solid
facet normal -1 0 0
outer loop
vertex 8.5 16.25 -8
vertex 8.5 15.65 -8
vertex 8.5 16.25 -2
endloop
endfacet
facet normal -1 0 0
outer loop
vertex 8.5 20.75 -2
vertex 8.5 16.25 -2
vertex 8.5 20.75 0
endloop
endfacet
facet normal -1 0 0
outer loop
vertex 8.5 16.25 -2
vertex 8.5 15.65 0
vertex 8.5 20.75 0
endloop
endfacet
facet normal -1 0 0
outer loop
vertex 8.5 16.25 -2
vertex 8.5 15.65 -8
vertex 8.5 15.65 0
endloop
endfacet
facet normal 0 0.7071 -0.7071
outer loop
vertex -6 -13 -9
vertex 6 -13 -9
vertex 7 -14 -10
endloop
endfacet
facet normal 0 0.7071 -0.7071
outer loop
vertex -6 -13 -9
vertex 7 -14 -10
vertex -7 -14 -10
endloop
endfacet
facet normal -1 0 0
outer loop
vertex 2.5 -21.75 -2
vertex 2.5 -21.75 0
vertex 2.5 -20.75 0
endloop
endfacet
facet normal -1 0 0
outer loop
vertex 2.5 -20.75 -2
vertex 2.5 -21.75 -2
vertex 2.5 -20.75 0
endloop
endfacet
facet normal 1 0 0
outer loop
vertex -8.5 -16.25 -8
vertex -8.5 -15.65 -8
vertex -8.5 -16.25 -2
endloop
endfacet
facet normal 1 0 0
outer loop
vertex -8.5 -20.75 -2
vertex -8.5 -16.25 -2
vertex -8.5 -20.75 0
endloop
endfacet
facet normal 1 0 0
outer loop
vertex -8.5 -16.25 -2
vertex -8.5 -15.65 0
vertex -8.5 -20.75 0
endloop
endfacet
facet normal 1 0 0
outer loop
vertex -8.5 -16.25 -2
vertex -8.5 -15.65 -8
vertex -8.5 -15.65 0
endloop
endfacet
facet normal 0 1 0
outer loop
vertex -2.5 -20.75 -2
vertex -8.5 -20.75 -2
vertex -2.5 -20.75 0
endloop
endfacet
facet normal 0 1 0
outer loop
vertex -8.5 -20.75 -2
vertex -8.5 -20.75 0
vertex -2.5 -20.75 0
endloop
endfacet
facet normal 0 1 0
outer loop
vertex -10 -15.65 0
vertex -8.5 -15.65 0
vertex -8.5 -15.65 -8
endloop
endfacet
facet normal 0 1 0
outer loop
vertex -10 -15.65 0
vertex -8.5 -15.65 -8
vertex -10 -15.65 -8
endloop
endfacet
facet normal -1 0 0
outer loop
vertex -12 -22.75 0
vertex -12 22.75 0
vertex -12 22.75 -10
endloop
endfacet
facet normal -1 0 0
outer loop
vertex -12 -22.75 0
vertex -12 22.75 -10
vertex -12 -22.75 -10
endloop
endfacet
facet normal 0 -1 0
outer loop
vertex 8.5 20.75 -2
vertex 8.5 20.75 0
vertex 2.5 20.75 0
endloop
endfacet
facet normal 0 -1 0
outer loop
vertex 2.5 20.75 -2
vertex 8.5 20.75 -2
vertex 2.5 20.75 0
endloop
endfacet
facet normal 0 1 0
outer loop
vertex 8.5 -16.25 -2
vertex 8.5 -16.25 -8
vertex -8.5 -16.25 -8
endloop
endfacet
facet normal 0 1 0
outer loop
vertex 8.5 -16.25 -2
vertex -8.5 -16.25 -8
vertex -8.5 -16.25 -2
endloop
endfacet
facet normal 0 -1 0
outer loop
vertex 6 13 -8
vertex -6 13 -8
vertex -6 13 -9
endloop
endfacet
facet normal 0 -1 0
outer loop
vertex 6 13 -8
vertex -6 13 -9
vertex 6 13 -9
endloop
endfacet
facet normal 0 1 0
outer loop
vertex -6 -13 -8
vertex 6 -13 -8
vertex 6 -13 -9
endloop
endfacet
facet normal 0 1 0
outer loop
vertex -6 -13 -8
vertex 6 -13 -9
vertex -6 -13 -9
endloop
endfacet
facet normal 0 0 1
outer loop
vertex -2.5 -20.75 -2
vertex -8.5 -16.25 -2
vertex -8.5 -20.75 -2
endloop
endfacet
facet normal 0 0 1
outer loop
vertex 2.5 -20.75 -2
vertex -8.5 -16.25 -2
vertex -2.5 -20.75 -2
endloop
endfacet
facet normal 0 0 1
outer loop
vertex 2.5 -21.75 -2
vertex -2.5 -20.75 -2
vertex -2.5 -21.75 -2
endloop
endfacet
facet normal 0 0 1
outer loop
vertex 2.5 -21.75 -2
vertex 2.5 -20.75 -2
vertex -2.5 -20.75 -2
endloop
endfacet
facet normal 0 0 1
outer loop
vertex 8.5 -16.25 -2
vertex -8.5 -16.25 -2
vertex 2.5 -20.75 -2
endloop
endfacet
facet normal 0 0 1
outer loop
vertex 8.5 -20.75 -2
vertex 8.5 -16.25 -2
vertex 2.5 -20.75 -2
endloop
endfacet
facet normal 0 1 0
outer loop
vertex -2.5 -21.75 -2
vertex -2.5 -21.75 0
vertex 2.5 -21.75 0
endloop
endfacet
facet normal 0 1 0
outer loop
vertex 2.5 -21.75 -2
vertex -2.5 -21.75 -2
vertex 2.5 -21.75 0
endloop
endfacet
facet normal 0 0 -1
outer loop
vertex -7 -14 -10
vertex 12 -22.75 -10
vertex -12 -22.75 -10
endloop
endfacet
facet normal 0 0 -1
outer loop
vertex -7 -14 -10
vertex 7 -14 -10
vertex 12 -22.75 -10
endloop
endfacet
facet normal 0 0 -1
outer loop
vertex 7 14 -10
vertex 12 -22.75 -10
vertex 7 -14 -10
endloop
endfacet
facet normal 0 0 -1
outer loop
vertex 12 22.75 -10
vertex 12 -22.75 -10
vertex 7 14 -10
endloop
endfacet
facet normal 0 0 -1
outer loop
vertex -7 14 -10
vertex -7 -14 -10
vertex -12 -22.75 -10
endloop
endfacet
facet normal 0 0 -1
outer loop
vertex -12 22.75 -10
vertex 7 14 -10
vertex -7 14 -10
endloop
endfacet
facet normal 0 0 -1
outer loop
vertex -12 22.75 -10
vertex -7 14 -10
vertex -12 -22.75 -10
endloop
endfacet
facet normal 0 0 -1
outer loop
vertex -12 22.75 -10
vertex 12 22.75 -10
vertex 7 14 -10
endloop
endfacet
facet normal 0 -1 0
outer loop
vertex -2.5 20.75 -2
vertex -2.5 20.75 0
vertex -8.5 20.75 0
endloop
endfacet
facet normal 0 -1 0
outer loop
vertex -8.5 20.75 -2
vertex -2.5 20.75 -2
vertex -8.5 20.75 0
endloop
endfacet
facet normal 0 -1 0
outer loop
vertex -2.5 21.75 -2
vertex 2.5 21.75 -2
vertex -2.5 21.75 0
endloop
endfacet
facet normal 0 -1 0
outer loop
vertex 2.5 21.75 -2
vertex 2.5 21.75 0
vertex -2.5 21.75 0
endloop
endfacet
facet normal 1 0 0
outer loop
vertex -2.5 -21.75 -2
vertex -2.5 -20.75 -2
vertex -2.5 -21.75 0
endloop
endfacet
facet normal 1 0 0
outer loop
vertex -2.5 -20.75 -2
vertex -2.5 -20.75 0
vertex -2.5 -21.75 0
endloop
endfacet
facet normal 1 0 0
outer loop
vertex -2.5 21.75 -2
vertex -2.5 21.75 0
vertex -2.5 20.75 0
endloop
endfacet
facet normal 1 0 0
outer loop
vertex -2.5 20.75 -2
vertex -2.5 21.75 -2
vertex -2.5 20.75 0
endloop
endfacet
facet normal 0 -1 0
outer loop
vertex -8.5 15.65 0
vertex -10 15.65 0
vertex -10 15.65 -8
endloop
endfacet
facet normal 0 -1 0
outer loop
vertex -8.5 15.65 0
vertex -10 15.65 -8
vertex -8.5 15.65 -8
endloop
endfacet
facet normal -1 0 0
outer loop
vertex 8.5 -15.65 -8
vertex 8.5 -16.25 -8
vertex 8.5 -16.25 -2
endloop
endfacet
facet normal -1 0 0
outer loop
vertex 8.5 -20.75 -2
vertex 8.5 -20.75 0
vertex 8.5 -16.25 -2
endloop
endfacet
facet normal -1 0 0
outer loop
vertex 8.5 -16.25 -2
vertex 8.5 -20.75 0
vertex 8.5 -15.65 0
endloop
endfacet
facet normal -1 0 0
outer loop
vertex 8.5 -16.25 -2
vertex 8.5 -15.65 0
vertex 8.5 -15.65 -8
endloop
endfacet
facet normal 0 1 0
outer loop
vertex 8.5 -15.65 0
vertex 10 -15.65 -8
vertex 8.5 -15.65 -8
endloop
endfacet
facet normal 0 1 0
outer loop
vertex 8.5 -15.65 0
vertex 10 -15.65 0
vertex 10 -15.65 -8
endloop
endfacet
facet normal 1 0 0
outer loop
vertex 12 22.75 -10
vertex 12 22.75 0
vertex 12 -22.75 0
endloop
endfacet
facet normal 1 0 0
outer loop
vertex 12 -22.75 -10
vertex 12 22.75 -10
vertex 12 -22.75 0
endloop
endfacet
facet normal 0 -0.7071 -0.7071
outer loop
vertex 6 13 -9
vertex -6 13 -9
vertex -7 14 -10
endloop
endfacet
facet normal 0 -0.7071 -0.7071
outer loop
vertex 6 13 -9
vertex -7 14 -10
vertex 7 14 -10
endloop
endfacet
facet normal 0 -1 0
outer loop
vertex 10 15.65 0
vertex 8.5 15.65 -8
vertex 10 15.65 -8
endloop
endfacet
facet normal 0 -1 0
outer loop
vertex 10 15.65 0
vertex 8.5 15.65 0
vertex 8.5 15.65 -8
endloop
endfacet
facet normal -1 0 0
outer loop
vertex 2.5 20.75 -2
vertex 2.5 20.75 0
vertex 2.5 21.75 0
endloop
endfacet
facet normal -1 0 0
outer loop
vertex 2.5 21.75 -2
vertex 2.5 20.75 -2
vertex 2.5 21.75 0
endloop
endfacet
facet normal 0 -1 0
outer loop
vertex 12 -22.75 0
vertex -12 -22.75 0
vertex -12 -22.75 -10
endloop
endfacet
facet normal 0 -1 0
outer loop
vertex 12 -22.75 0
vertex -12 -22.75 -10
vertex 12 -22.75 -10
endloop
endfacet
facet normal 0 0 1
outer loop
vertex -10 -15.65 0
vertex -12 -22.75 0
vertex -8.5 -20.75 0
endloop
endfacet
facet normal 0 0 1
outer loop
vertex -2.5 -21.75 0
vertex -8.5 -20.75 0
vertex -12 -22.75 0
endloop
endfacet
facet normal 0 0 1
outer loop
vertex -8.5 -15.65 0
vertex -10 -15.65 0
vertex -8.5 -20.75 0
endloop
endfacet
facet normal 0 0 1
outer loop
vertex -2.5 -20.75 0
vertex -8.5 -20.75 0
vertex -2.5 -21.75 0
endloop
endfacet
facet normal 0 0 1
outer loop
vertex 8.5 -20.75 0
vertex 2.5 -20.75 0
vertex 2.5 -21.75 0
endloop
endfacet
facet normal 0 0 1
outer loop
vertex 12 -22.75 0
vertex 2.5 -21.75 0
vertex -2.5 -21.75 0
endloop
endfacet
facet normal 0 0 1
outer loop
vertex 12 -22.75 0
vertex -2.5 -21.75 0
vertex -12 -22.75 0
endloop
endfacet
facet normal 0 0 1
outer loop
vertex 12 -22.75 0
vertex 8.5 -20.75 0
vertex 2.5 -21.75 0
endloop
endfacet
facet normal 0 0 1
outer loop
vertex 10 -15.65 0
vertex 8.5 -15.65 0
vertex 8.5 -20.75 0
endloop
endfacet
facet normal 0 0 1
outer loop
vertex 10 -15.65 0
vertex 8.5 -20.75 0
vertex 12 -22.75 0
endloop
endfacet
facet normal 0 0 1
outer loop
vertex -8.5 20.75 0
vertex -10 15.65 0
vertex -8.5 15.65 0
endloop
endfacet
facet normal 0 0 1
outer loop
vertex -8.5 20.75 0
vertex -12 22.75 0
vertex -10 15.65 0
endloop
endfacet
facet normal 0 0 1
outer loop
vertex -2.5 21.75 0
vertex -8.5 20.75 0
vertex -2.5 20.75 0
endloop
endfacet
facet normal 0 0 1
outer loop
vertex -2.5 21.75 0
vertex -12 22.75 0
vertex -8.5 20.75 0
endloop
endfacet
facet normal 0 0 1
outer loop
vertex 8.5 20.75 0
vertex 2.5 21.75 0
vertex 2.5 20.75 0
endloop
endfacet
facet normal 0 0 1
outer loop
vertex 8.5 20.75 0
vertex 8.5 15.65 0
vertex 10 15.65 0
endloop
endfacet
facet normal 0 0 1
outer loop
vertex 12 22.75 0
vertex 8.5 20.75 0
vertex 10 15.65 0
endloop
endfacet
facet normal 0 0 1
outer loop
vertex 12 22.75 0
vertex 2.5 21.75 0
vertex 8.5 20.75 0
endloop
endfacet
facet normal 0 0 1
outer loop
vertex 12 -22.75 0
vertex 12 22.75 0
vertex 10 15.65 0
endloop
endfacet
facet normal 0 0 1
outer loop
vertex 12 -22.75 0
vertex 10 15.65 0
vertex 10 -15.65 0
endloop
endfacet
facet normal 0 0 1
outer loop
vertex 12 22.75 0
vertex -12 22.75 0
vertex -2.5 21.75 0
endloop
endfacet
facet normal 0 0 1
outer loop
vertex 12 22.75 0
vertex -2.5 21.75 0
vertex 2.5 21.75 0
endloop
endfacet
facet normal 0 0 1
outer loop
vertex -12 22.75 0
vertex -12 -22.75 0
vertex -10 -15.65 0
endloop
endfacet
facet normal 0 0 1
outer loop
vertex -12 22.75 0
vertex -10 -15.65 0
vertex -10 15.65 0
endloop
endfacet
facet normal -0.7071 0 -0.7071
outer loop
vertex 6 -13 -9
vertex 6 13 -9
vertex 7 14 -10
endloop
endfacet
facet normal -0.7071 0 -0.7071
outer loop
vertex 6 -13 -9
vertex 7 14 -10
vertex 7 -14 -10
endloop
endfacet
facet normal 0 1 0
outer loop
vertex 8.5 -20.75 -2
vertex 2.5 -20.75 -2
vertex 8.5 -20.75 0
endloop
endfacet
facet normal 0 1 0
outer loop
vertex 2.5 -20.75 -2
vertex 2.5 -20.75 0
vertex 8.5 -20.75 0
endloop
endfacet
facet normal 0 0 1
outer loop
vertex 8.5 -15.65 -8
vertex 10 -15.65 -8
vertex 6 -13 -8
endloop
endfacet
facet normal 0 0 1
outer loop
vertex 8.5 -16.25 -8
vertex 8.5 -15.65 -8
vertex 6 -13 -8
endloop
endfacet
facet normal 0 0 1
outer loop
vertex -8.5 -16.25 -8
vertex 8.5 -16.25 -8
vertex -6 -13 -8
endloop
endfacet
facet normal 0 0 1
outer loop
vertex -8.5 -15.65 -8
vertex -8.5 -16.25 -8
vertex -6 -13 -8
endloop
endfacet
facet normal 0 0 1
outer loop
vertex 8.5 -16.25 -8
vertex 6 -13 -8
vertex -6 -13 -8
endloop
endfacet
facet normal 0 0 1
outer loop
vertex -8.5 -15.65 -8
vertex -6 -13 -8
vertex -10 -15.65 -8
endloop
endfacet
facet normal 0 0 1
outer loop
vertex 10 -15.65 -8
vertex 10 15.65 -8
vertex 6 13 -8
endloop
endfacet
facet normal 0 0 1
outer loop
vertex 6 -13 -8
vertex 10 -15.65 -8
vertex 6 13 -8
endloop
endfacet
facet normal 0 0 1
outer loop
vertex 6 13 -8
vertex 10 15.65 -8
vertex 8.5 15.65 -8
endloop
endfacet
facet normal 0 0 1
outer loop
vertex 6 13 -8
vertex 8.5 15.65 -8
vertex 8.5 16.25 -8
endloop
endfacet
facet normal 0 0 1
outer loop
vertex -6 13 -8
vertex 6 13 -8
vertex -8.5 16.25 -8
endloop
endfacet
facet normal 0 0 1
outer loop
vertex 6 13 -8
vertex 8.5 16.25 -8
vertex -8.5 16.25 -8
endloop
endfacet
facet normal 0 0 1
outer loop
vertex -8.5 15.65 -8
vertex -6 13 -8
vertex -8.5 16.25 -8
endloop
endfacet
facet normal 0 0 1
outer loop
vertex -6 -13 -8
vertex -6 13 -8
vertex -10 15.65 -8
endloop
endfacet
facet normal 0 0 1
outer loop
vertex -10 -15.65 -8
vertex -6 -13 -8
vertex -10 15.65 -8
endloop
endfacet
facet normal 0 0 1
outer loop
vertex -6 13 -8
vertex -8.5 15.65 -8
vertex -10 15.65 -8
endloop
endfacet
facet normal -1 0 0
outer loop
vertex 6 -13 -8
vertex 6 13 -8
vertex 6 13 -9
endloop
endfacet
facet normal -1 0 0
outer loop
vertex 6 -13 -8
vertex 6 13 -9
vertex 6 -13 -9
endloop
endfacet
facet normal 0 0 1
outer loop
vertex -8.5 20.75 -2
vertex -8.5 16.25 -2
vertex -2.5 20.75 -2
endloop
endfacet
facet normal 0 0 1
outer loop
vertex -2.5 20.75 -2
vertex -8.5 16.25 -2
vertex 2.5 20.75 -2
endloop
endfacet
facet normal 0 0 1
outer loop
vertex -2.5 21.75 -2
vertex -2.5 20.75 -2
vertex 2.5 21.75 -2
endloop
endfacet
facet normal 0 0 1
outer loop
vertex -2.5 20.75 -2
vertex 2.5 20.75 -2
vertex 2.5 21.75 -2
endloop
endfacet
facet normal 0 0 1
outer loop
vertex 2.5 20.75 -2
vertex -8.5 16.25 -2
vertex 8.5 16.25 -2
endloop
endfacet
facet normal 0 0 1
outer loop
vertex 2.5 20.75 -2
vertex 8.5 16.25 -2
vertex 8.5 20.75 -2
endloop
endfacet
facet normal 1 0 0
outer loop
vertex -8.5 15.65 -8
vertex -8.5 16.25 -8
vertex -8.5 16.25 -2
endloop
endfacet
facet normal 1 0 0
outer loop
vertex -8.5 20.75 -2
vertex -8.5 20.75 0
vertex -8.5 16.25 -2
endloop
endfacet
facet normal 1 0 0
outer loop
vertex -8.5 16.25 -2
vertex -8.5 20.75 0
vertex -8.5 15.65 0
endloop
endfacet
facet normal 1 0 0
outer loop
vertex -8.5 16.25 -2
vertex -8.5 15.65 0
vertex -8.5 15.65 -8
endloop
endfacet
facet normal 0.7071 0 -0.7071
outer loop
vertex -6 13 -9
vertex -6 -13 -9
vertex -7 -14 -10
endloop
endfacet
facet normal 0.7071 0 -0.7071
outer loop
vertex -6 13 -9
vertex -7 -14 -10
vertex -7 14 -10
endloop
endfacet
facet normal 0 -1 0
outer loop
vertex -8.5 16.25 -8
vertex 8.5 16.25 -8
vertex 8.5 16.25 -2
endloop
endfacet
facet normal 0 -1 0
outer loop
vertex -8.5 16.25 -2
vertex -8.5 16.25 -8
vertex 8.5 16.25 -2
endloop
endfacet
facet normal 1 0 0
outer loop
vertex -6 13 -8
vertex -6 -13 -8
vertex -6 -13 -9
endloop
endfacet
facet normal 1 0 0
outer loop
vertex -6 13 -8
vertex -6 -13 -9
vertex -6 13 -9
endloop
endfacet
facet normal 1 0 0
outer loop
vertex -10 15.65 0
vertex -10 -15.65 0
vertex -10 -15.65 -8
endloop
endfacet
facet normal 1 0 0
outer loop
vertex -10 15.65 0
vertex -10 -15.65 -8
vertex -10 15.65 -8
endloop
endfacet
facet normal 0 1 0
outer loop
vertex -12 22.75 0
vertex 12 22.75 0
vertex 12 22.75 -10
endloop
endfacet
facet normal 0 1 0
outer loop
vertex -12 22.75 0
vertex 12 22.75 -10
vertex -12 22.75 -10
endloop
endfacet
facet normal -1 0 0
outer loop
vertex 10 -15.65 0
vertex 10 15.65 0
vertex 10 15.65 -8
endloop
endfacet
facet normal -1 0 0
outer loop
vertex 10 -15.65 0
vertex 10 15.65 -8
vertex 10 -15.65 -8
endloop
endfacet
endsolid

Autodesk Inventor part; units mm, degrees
ref_plane "YZ Plane" through (0, 0, 0) normal (1, 0, 0) x (0, 1, 0)
ref_plane "XZ Plane" through (0, 0, 0) normal (0, 1, 0) x (-1, 0, 0)
ref_plane "XY Plane" through (0, 0, 0) normal (0, 0, 1) x (1, 0, 0)
sketch "Sketch1" plane through (0, 0, 0) normal (0, 0, 1) x (1, 0, 0)
  line L0 (-10, -15.65) -> (-10, 15.65) projected
  line L1 (-10, 15.65) -> (10, 15.65) projected
  line L2 (10, 15.65) -> (10, -15.65) projected
  line L3 (10, -15.65) -> (-10, -15.65) projected
  line L4 (1.5877, -12.1184) -> (1.5877, -10.9726) projected
  line L5 (5.119, -12.1184) -> (1.5877, -12.1184) projected
  line L6 (5.119, 11.1491) -> (5.119, -12.1184) projected
  line L7 (2.2936, 11.1491) -> (5.119, 11.1491) projected
  line L8 (2.2936, 12.739) -> (2.2936, 11.1491) projected
  line L9 (-2.2936, 12.739) -> (2.2936, 12.739) projected
  line L10 (-2.2936, 11.1491) -> (-2.2936, 12.739) projected
  line L11 (-5.119, 11.1491) -> (-2.2936, 11.1491) projected
  line L12 (-5.119, -12.1184) -> (-5.119, 11.1491) projected
  line L13 (-1.5877, -12.1184) -> (-5.119, -12.1184) projected
  line L14 (-1.5877, -10.9726) -> (-1.5877, -12.1184) projected
  line L15 (-4.1285, -10.9726) -> (-1.5877, -10.9726) projected
  line L16 (-4.1285, 10.0169) -> (-4.1285, -10.9726) projected
  line L17 (4.1285, 10.0169) -> (-4.1285, 10.0169) projected
  line L18 (4.1285, -10.9726) -> (4.1285, 10.0169) projected
  line L19 (1.5877, -10.9726) -> (4.1285, -10.9726) projected
  line L20 (2.9107, -1.4409) -> (2.9107, -4.3502) projected
  line L21 (-2.9107, -1.4409) -> (2.9107, -1.4409) projected
  line L22 (-2.9107, -4.3502) -> (-2.9107, -1.4409) projected
  line L23 (2.9107, -4.3502) -> (-2.9107, -4.3502) projected
  line L24 (2.9107, 7.9067) -> (2.9107, 4.9905) projected
  line L25 (-2.9107, 7.9067) -> (2.9107, 7.9067) projected
  line L26 (-2.9107, 4.9905) -> (-2.9107, 7.9067) projected
  line L27 (2.9107, 4.9905) -> (-2.9107, 4.9905) projected
  line L28 (2.9107, 3.2342) -> (2.9107, 0.4013) projected
  line L29 (-2.9107, 3.2342) -> (2.9107, 3.2342) projected
  line L30 (-2.9107, 0.4013) -> (-2.9107, 3.2342) projected
  line L31 (2.9107, 0.4013) -> (-2.9107, 0.4013) projected
  line L32 (2.9107, -6.1253) -> (2.9107, -8.9213) projected
  line L33 (-2.9107, -6.1253) -> (2.9107, -6.1253) projected
  line L34 (-2.9107, -8.9213) -> (-2.9107, -6.1253) projected
  line L35 (2.9107, -8.9213) -> (-2.9107, -8.9213) projected
  line L36 (-2.5, 20.75) -> (-8.5, 20.75) projected
  line L37 (-2.5, 21.75) -> (-2.5, 20.75) projected
  line L38 (2.5, 21.75) -> (-2.5, 21.75) projected
  line L39 (2.5, 20.75) -> (2.5, 21.75) projected
  line L40 (8.5, 20.75) -> (2.5, 20.75) projected
  line L41 (8.5, 15.65) -> (8.5, 20.75) projected
  line L42 (-8.5, 15.65) -> (8.5, 15.65) projected
  line L43 (-8.5, 20.75) -> (-8.5, 15.65) projected
  circle A0 centre (0, 18) radius 1.2 projected
  line L44 (-8.5, -15.65) -> (-8.5, -20.75) projected
  line L45 (8.5, -15.65) -> (-8.5, -15.65) projected
  line L46 (8.5, -20.75) -> (8.5, -15.65) projected
  line L47 (2.5, -20.75) -> (8.5, -20.75) projected
  line L48 (2.5, -21.75) -> (2.5, -20.75) projected
  line L49 (-2.5, -21.75) -> (2.5, -21.75) projected
  line L50 (-2.5, -20.75) -> (-2.5, -21.75) projected
  line L51 (-8.5, -20.75) -> (-2.5, -20.75) projected
  circle A1 centre (0, -18) radius 1.2 projected
  line L52 (12, 22.75) -> (-12, 22.75)
  line L53 (-12, 22.75) -> (-12, -22.75)
  line L54 (-12, -22.75) -> (12, -22.75)
  line L55 (12, -22.75) -> (12, 22.75)
  point P0 (0, 0)
  dimension "d0" = 2
  dimension "d1" = 2
  dimension "d2" = 2
  dimension "d3" = 2
extrude "Extrusion1" add sketch "Sketch1" against normal blind 8 contours L55 L54 L53 L52
ref_plane "Work Plane1" through (0, -22.75, 0) normal (-1, 0, 0) x (0, 0, 1)
sketch "Sketch2" plane through (0, -22.75, 0) normal (-1, 0, 0) x (0, 0, 1)
  line L0 (0, 44.5) -> (-8, 44.5) projected
  line L1 (-8, 0) -> (-8, 45.5) projected
  line L2 (-2, 44.5) -> (-8, 44.5)
  line L3 (-8, 44.5) -> (-8, 39)
  line L4 (-8, 39) -> (-2, 39)
  line L5 (-2, 39) -> (-2, 44.5)
  line L6 (-8, 38.4) -> (-8, 7.1) projected
  line L7 (-8, 22.75) -> (6.4462, 22.75)
  line L8 (0, 1) -> (-8, 1)
  line L9 (-2, 1) -> (-8, 1)
  line L10 (-8, 1) -> (-8, 6.5)
  line L11 (-8, 6.5) -> (-2, 6.5)
  line L12 (-2, 6.5) -> (-2, 1)
  point P0 (0, 22.75)
extrude "Extrusion2" add sketch "Sketch2" along normal mid plane 24
sketch "Sketch3" plane through (0, 0, -8) normal (0, 0, -1) x (-1, 0, 0)
  line L0 (-12, 22.75) -> (-12, -22.75) projected
  line L1 (-12, 22.75) -> (12, 22.75)
  line L2 (12, 22.75) -> (12, -22.75)
  line L3 (12, -22.75) -> (-12, -22.75)
  line L4 (-12, -22.75) -> (-12, 22.75)
  line L5 (-6, -13) -> (6, -13)
  line L6 (6, -13) -> (6, 13)
  line L7 (6, 13) -> (-6, 13)
  line L8 (-6, 13) -> (-6, -13)
  point P0 (0, 0)
extrude "Extrusion3" add sketch "Sketch3" along normal blind 2
chamfer "Chamfer1" distance 1 angle 45 4 edges at (0, 13, -10) (-6, 0, -10) (6, 0, -10) (0, -13, -10) measured on face at (-10, 4.3333, -10)
equation "\"d1\" = d0"
equation "\"d2\" = d1"
equation "\"d3\" = d1"
properties part number "battery indicator case"
